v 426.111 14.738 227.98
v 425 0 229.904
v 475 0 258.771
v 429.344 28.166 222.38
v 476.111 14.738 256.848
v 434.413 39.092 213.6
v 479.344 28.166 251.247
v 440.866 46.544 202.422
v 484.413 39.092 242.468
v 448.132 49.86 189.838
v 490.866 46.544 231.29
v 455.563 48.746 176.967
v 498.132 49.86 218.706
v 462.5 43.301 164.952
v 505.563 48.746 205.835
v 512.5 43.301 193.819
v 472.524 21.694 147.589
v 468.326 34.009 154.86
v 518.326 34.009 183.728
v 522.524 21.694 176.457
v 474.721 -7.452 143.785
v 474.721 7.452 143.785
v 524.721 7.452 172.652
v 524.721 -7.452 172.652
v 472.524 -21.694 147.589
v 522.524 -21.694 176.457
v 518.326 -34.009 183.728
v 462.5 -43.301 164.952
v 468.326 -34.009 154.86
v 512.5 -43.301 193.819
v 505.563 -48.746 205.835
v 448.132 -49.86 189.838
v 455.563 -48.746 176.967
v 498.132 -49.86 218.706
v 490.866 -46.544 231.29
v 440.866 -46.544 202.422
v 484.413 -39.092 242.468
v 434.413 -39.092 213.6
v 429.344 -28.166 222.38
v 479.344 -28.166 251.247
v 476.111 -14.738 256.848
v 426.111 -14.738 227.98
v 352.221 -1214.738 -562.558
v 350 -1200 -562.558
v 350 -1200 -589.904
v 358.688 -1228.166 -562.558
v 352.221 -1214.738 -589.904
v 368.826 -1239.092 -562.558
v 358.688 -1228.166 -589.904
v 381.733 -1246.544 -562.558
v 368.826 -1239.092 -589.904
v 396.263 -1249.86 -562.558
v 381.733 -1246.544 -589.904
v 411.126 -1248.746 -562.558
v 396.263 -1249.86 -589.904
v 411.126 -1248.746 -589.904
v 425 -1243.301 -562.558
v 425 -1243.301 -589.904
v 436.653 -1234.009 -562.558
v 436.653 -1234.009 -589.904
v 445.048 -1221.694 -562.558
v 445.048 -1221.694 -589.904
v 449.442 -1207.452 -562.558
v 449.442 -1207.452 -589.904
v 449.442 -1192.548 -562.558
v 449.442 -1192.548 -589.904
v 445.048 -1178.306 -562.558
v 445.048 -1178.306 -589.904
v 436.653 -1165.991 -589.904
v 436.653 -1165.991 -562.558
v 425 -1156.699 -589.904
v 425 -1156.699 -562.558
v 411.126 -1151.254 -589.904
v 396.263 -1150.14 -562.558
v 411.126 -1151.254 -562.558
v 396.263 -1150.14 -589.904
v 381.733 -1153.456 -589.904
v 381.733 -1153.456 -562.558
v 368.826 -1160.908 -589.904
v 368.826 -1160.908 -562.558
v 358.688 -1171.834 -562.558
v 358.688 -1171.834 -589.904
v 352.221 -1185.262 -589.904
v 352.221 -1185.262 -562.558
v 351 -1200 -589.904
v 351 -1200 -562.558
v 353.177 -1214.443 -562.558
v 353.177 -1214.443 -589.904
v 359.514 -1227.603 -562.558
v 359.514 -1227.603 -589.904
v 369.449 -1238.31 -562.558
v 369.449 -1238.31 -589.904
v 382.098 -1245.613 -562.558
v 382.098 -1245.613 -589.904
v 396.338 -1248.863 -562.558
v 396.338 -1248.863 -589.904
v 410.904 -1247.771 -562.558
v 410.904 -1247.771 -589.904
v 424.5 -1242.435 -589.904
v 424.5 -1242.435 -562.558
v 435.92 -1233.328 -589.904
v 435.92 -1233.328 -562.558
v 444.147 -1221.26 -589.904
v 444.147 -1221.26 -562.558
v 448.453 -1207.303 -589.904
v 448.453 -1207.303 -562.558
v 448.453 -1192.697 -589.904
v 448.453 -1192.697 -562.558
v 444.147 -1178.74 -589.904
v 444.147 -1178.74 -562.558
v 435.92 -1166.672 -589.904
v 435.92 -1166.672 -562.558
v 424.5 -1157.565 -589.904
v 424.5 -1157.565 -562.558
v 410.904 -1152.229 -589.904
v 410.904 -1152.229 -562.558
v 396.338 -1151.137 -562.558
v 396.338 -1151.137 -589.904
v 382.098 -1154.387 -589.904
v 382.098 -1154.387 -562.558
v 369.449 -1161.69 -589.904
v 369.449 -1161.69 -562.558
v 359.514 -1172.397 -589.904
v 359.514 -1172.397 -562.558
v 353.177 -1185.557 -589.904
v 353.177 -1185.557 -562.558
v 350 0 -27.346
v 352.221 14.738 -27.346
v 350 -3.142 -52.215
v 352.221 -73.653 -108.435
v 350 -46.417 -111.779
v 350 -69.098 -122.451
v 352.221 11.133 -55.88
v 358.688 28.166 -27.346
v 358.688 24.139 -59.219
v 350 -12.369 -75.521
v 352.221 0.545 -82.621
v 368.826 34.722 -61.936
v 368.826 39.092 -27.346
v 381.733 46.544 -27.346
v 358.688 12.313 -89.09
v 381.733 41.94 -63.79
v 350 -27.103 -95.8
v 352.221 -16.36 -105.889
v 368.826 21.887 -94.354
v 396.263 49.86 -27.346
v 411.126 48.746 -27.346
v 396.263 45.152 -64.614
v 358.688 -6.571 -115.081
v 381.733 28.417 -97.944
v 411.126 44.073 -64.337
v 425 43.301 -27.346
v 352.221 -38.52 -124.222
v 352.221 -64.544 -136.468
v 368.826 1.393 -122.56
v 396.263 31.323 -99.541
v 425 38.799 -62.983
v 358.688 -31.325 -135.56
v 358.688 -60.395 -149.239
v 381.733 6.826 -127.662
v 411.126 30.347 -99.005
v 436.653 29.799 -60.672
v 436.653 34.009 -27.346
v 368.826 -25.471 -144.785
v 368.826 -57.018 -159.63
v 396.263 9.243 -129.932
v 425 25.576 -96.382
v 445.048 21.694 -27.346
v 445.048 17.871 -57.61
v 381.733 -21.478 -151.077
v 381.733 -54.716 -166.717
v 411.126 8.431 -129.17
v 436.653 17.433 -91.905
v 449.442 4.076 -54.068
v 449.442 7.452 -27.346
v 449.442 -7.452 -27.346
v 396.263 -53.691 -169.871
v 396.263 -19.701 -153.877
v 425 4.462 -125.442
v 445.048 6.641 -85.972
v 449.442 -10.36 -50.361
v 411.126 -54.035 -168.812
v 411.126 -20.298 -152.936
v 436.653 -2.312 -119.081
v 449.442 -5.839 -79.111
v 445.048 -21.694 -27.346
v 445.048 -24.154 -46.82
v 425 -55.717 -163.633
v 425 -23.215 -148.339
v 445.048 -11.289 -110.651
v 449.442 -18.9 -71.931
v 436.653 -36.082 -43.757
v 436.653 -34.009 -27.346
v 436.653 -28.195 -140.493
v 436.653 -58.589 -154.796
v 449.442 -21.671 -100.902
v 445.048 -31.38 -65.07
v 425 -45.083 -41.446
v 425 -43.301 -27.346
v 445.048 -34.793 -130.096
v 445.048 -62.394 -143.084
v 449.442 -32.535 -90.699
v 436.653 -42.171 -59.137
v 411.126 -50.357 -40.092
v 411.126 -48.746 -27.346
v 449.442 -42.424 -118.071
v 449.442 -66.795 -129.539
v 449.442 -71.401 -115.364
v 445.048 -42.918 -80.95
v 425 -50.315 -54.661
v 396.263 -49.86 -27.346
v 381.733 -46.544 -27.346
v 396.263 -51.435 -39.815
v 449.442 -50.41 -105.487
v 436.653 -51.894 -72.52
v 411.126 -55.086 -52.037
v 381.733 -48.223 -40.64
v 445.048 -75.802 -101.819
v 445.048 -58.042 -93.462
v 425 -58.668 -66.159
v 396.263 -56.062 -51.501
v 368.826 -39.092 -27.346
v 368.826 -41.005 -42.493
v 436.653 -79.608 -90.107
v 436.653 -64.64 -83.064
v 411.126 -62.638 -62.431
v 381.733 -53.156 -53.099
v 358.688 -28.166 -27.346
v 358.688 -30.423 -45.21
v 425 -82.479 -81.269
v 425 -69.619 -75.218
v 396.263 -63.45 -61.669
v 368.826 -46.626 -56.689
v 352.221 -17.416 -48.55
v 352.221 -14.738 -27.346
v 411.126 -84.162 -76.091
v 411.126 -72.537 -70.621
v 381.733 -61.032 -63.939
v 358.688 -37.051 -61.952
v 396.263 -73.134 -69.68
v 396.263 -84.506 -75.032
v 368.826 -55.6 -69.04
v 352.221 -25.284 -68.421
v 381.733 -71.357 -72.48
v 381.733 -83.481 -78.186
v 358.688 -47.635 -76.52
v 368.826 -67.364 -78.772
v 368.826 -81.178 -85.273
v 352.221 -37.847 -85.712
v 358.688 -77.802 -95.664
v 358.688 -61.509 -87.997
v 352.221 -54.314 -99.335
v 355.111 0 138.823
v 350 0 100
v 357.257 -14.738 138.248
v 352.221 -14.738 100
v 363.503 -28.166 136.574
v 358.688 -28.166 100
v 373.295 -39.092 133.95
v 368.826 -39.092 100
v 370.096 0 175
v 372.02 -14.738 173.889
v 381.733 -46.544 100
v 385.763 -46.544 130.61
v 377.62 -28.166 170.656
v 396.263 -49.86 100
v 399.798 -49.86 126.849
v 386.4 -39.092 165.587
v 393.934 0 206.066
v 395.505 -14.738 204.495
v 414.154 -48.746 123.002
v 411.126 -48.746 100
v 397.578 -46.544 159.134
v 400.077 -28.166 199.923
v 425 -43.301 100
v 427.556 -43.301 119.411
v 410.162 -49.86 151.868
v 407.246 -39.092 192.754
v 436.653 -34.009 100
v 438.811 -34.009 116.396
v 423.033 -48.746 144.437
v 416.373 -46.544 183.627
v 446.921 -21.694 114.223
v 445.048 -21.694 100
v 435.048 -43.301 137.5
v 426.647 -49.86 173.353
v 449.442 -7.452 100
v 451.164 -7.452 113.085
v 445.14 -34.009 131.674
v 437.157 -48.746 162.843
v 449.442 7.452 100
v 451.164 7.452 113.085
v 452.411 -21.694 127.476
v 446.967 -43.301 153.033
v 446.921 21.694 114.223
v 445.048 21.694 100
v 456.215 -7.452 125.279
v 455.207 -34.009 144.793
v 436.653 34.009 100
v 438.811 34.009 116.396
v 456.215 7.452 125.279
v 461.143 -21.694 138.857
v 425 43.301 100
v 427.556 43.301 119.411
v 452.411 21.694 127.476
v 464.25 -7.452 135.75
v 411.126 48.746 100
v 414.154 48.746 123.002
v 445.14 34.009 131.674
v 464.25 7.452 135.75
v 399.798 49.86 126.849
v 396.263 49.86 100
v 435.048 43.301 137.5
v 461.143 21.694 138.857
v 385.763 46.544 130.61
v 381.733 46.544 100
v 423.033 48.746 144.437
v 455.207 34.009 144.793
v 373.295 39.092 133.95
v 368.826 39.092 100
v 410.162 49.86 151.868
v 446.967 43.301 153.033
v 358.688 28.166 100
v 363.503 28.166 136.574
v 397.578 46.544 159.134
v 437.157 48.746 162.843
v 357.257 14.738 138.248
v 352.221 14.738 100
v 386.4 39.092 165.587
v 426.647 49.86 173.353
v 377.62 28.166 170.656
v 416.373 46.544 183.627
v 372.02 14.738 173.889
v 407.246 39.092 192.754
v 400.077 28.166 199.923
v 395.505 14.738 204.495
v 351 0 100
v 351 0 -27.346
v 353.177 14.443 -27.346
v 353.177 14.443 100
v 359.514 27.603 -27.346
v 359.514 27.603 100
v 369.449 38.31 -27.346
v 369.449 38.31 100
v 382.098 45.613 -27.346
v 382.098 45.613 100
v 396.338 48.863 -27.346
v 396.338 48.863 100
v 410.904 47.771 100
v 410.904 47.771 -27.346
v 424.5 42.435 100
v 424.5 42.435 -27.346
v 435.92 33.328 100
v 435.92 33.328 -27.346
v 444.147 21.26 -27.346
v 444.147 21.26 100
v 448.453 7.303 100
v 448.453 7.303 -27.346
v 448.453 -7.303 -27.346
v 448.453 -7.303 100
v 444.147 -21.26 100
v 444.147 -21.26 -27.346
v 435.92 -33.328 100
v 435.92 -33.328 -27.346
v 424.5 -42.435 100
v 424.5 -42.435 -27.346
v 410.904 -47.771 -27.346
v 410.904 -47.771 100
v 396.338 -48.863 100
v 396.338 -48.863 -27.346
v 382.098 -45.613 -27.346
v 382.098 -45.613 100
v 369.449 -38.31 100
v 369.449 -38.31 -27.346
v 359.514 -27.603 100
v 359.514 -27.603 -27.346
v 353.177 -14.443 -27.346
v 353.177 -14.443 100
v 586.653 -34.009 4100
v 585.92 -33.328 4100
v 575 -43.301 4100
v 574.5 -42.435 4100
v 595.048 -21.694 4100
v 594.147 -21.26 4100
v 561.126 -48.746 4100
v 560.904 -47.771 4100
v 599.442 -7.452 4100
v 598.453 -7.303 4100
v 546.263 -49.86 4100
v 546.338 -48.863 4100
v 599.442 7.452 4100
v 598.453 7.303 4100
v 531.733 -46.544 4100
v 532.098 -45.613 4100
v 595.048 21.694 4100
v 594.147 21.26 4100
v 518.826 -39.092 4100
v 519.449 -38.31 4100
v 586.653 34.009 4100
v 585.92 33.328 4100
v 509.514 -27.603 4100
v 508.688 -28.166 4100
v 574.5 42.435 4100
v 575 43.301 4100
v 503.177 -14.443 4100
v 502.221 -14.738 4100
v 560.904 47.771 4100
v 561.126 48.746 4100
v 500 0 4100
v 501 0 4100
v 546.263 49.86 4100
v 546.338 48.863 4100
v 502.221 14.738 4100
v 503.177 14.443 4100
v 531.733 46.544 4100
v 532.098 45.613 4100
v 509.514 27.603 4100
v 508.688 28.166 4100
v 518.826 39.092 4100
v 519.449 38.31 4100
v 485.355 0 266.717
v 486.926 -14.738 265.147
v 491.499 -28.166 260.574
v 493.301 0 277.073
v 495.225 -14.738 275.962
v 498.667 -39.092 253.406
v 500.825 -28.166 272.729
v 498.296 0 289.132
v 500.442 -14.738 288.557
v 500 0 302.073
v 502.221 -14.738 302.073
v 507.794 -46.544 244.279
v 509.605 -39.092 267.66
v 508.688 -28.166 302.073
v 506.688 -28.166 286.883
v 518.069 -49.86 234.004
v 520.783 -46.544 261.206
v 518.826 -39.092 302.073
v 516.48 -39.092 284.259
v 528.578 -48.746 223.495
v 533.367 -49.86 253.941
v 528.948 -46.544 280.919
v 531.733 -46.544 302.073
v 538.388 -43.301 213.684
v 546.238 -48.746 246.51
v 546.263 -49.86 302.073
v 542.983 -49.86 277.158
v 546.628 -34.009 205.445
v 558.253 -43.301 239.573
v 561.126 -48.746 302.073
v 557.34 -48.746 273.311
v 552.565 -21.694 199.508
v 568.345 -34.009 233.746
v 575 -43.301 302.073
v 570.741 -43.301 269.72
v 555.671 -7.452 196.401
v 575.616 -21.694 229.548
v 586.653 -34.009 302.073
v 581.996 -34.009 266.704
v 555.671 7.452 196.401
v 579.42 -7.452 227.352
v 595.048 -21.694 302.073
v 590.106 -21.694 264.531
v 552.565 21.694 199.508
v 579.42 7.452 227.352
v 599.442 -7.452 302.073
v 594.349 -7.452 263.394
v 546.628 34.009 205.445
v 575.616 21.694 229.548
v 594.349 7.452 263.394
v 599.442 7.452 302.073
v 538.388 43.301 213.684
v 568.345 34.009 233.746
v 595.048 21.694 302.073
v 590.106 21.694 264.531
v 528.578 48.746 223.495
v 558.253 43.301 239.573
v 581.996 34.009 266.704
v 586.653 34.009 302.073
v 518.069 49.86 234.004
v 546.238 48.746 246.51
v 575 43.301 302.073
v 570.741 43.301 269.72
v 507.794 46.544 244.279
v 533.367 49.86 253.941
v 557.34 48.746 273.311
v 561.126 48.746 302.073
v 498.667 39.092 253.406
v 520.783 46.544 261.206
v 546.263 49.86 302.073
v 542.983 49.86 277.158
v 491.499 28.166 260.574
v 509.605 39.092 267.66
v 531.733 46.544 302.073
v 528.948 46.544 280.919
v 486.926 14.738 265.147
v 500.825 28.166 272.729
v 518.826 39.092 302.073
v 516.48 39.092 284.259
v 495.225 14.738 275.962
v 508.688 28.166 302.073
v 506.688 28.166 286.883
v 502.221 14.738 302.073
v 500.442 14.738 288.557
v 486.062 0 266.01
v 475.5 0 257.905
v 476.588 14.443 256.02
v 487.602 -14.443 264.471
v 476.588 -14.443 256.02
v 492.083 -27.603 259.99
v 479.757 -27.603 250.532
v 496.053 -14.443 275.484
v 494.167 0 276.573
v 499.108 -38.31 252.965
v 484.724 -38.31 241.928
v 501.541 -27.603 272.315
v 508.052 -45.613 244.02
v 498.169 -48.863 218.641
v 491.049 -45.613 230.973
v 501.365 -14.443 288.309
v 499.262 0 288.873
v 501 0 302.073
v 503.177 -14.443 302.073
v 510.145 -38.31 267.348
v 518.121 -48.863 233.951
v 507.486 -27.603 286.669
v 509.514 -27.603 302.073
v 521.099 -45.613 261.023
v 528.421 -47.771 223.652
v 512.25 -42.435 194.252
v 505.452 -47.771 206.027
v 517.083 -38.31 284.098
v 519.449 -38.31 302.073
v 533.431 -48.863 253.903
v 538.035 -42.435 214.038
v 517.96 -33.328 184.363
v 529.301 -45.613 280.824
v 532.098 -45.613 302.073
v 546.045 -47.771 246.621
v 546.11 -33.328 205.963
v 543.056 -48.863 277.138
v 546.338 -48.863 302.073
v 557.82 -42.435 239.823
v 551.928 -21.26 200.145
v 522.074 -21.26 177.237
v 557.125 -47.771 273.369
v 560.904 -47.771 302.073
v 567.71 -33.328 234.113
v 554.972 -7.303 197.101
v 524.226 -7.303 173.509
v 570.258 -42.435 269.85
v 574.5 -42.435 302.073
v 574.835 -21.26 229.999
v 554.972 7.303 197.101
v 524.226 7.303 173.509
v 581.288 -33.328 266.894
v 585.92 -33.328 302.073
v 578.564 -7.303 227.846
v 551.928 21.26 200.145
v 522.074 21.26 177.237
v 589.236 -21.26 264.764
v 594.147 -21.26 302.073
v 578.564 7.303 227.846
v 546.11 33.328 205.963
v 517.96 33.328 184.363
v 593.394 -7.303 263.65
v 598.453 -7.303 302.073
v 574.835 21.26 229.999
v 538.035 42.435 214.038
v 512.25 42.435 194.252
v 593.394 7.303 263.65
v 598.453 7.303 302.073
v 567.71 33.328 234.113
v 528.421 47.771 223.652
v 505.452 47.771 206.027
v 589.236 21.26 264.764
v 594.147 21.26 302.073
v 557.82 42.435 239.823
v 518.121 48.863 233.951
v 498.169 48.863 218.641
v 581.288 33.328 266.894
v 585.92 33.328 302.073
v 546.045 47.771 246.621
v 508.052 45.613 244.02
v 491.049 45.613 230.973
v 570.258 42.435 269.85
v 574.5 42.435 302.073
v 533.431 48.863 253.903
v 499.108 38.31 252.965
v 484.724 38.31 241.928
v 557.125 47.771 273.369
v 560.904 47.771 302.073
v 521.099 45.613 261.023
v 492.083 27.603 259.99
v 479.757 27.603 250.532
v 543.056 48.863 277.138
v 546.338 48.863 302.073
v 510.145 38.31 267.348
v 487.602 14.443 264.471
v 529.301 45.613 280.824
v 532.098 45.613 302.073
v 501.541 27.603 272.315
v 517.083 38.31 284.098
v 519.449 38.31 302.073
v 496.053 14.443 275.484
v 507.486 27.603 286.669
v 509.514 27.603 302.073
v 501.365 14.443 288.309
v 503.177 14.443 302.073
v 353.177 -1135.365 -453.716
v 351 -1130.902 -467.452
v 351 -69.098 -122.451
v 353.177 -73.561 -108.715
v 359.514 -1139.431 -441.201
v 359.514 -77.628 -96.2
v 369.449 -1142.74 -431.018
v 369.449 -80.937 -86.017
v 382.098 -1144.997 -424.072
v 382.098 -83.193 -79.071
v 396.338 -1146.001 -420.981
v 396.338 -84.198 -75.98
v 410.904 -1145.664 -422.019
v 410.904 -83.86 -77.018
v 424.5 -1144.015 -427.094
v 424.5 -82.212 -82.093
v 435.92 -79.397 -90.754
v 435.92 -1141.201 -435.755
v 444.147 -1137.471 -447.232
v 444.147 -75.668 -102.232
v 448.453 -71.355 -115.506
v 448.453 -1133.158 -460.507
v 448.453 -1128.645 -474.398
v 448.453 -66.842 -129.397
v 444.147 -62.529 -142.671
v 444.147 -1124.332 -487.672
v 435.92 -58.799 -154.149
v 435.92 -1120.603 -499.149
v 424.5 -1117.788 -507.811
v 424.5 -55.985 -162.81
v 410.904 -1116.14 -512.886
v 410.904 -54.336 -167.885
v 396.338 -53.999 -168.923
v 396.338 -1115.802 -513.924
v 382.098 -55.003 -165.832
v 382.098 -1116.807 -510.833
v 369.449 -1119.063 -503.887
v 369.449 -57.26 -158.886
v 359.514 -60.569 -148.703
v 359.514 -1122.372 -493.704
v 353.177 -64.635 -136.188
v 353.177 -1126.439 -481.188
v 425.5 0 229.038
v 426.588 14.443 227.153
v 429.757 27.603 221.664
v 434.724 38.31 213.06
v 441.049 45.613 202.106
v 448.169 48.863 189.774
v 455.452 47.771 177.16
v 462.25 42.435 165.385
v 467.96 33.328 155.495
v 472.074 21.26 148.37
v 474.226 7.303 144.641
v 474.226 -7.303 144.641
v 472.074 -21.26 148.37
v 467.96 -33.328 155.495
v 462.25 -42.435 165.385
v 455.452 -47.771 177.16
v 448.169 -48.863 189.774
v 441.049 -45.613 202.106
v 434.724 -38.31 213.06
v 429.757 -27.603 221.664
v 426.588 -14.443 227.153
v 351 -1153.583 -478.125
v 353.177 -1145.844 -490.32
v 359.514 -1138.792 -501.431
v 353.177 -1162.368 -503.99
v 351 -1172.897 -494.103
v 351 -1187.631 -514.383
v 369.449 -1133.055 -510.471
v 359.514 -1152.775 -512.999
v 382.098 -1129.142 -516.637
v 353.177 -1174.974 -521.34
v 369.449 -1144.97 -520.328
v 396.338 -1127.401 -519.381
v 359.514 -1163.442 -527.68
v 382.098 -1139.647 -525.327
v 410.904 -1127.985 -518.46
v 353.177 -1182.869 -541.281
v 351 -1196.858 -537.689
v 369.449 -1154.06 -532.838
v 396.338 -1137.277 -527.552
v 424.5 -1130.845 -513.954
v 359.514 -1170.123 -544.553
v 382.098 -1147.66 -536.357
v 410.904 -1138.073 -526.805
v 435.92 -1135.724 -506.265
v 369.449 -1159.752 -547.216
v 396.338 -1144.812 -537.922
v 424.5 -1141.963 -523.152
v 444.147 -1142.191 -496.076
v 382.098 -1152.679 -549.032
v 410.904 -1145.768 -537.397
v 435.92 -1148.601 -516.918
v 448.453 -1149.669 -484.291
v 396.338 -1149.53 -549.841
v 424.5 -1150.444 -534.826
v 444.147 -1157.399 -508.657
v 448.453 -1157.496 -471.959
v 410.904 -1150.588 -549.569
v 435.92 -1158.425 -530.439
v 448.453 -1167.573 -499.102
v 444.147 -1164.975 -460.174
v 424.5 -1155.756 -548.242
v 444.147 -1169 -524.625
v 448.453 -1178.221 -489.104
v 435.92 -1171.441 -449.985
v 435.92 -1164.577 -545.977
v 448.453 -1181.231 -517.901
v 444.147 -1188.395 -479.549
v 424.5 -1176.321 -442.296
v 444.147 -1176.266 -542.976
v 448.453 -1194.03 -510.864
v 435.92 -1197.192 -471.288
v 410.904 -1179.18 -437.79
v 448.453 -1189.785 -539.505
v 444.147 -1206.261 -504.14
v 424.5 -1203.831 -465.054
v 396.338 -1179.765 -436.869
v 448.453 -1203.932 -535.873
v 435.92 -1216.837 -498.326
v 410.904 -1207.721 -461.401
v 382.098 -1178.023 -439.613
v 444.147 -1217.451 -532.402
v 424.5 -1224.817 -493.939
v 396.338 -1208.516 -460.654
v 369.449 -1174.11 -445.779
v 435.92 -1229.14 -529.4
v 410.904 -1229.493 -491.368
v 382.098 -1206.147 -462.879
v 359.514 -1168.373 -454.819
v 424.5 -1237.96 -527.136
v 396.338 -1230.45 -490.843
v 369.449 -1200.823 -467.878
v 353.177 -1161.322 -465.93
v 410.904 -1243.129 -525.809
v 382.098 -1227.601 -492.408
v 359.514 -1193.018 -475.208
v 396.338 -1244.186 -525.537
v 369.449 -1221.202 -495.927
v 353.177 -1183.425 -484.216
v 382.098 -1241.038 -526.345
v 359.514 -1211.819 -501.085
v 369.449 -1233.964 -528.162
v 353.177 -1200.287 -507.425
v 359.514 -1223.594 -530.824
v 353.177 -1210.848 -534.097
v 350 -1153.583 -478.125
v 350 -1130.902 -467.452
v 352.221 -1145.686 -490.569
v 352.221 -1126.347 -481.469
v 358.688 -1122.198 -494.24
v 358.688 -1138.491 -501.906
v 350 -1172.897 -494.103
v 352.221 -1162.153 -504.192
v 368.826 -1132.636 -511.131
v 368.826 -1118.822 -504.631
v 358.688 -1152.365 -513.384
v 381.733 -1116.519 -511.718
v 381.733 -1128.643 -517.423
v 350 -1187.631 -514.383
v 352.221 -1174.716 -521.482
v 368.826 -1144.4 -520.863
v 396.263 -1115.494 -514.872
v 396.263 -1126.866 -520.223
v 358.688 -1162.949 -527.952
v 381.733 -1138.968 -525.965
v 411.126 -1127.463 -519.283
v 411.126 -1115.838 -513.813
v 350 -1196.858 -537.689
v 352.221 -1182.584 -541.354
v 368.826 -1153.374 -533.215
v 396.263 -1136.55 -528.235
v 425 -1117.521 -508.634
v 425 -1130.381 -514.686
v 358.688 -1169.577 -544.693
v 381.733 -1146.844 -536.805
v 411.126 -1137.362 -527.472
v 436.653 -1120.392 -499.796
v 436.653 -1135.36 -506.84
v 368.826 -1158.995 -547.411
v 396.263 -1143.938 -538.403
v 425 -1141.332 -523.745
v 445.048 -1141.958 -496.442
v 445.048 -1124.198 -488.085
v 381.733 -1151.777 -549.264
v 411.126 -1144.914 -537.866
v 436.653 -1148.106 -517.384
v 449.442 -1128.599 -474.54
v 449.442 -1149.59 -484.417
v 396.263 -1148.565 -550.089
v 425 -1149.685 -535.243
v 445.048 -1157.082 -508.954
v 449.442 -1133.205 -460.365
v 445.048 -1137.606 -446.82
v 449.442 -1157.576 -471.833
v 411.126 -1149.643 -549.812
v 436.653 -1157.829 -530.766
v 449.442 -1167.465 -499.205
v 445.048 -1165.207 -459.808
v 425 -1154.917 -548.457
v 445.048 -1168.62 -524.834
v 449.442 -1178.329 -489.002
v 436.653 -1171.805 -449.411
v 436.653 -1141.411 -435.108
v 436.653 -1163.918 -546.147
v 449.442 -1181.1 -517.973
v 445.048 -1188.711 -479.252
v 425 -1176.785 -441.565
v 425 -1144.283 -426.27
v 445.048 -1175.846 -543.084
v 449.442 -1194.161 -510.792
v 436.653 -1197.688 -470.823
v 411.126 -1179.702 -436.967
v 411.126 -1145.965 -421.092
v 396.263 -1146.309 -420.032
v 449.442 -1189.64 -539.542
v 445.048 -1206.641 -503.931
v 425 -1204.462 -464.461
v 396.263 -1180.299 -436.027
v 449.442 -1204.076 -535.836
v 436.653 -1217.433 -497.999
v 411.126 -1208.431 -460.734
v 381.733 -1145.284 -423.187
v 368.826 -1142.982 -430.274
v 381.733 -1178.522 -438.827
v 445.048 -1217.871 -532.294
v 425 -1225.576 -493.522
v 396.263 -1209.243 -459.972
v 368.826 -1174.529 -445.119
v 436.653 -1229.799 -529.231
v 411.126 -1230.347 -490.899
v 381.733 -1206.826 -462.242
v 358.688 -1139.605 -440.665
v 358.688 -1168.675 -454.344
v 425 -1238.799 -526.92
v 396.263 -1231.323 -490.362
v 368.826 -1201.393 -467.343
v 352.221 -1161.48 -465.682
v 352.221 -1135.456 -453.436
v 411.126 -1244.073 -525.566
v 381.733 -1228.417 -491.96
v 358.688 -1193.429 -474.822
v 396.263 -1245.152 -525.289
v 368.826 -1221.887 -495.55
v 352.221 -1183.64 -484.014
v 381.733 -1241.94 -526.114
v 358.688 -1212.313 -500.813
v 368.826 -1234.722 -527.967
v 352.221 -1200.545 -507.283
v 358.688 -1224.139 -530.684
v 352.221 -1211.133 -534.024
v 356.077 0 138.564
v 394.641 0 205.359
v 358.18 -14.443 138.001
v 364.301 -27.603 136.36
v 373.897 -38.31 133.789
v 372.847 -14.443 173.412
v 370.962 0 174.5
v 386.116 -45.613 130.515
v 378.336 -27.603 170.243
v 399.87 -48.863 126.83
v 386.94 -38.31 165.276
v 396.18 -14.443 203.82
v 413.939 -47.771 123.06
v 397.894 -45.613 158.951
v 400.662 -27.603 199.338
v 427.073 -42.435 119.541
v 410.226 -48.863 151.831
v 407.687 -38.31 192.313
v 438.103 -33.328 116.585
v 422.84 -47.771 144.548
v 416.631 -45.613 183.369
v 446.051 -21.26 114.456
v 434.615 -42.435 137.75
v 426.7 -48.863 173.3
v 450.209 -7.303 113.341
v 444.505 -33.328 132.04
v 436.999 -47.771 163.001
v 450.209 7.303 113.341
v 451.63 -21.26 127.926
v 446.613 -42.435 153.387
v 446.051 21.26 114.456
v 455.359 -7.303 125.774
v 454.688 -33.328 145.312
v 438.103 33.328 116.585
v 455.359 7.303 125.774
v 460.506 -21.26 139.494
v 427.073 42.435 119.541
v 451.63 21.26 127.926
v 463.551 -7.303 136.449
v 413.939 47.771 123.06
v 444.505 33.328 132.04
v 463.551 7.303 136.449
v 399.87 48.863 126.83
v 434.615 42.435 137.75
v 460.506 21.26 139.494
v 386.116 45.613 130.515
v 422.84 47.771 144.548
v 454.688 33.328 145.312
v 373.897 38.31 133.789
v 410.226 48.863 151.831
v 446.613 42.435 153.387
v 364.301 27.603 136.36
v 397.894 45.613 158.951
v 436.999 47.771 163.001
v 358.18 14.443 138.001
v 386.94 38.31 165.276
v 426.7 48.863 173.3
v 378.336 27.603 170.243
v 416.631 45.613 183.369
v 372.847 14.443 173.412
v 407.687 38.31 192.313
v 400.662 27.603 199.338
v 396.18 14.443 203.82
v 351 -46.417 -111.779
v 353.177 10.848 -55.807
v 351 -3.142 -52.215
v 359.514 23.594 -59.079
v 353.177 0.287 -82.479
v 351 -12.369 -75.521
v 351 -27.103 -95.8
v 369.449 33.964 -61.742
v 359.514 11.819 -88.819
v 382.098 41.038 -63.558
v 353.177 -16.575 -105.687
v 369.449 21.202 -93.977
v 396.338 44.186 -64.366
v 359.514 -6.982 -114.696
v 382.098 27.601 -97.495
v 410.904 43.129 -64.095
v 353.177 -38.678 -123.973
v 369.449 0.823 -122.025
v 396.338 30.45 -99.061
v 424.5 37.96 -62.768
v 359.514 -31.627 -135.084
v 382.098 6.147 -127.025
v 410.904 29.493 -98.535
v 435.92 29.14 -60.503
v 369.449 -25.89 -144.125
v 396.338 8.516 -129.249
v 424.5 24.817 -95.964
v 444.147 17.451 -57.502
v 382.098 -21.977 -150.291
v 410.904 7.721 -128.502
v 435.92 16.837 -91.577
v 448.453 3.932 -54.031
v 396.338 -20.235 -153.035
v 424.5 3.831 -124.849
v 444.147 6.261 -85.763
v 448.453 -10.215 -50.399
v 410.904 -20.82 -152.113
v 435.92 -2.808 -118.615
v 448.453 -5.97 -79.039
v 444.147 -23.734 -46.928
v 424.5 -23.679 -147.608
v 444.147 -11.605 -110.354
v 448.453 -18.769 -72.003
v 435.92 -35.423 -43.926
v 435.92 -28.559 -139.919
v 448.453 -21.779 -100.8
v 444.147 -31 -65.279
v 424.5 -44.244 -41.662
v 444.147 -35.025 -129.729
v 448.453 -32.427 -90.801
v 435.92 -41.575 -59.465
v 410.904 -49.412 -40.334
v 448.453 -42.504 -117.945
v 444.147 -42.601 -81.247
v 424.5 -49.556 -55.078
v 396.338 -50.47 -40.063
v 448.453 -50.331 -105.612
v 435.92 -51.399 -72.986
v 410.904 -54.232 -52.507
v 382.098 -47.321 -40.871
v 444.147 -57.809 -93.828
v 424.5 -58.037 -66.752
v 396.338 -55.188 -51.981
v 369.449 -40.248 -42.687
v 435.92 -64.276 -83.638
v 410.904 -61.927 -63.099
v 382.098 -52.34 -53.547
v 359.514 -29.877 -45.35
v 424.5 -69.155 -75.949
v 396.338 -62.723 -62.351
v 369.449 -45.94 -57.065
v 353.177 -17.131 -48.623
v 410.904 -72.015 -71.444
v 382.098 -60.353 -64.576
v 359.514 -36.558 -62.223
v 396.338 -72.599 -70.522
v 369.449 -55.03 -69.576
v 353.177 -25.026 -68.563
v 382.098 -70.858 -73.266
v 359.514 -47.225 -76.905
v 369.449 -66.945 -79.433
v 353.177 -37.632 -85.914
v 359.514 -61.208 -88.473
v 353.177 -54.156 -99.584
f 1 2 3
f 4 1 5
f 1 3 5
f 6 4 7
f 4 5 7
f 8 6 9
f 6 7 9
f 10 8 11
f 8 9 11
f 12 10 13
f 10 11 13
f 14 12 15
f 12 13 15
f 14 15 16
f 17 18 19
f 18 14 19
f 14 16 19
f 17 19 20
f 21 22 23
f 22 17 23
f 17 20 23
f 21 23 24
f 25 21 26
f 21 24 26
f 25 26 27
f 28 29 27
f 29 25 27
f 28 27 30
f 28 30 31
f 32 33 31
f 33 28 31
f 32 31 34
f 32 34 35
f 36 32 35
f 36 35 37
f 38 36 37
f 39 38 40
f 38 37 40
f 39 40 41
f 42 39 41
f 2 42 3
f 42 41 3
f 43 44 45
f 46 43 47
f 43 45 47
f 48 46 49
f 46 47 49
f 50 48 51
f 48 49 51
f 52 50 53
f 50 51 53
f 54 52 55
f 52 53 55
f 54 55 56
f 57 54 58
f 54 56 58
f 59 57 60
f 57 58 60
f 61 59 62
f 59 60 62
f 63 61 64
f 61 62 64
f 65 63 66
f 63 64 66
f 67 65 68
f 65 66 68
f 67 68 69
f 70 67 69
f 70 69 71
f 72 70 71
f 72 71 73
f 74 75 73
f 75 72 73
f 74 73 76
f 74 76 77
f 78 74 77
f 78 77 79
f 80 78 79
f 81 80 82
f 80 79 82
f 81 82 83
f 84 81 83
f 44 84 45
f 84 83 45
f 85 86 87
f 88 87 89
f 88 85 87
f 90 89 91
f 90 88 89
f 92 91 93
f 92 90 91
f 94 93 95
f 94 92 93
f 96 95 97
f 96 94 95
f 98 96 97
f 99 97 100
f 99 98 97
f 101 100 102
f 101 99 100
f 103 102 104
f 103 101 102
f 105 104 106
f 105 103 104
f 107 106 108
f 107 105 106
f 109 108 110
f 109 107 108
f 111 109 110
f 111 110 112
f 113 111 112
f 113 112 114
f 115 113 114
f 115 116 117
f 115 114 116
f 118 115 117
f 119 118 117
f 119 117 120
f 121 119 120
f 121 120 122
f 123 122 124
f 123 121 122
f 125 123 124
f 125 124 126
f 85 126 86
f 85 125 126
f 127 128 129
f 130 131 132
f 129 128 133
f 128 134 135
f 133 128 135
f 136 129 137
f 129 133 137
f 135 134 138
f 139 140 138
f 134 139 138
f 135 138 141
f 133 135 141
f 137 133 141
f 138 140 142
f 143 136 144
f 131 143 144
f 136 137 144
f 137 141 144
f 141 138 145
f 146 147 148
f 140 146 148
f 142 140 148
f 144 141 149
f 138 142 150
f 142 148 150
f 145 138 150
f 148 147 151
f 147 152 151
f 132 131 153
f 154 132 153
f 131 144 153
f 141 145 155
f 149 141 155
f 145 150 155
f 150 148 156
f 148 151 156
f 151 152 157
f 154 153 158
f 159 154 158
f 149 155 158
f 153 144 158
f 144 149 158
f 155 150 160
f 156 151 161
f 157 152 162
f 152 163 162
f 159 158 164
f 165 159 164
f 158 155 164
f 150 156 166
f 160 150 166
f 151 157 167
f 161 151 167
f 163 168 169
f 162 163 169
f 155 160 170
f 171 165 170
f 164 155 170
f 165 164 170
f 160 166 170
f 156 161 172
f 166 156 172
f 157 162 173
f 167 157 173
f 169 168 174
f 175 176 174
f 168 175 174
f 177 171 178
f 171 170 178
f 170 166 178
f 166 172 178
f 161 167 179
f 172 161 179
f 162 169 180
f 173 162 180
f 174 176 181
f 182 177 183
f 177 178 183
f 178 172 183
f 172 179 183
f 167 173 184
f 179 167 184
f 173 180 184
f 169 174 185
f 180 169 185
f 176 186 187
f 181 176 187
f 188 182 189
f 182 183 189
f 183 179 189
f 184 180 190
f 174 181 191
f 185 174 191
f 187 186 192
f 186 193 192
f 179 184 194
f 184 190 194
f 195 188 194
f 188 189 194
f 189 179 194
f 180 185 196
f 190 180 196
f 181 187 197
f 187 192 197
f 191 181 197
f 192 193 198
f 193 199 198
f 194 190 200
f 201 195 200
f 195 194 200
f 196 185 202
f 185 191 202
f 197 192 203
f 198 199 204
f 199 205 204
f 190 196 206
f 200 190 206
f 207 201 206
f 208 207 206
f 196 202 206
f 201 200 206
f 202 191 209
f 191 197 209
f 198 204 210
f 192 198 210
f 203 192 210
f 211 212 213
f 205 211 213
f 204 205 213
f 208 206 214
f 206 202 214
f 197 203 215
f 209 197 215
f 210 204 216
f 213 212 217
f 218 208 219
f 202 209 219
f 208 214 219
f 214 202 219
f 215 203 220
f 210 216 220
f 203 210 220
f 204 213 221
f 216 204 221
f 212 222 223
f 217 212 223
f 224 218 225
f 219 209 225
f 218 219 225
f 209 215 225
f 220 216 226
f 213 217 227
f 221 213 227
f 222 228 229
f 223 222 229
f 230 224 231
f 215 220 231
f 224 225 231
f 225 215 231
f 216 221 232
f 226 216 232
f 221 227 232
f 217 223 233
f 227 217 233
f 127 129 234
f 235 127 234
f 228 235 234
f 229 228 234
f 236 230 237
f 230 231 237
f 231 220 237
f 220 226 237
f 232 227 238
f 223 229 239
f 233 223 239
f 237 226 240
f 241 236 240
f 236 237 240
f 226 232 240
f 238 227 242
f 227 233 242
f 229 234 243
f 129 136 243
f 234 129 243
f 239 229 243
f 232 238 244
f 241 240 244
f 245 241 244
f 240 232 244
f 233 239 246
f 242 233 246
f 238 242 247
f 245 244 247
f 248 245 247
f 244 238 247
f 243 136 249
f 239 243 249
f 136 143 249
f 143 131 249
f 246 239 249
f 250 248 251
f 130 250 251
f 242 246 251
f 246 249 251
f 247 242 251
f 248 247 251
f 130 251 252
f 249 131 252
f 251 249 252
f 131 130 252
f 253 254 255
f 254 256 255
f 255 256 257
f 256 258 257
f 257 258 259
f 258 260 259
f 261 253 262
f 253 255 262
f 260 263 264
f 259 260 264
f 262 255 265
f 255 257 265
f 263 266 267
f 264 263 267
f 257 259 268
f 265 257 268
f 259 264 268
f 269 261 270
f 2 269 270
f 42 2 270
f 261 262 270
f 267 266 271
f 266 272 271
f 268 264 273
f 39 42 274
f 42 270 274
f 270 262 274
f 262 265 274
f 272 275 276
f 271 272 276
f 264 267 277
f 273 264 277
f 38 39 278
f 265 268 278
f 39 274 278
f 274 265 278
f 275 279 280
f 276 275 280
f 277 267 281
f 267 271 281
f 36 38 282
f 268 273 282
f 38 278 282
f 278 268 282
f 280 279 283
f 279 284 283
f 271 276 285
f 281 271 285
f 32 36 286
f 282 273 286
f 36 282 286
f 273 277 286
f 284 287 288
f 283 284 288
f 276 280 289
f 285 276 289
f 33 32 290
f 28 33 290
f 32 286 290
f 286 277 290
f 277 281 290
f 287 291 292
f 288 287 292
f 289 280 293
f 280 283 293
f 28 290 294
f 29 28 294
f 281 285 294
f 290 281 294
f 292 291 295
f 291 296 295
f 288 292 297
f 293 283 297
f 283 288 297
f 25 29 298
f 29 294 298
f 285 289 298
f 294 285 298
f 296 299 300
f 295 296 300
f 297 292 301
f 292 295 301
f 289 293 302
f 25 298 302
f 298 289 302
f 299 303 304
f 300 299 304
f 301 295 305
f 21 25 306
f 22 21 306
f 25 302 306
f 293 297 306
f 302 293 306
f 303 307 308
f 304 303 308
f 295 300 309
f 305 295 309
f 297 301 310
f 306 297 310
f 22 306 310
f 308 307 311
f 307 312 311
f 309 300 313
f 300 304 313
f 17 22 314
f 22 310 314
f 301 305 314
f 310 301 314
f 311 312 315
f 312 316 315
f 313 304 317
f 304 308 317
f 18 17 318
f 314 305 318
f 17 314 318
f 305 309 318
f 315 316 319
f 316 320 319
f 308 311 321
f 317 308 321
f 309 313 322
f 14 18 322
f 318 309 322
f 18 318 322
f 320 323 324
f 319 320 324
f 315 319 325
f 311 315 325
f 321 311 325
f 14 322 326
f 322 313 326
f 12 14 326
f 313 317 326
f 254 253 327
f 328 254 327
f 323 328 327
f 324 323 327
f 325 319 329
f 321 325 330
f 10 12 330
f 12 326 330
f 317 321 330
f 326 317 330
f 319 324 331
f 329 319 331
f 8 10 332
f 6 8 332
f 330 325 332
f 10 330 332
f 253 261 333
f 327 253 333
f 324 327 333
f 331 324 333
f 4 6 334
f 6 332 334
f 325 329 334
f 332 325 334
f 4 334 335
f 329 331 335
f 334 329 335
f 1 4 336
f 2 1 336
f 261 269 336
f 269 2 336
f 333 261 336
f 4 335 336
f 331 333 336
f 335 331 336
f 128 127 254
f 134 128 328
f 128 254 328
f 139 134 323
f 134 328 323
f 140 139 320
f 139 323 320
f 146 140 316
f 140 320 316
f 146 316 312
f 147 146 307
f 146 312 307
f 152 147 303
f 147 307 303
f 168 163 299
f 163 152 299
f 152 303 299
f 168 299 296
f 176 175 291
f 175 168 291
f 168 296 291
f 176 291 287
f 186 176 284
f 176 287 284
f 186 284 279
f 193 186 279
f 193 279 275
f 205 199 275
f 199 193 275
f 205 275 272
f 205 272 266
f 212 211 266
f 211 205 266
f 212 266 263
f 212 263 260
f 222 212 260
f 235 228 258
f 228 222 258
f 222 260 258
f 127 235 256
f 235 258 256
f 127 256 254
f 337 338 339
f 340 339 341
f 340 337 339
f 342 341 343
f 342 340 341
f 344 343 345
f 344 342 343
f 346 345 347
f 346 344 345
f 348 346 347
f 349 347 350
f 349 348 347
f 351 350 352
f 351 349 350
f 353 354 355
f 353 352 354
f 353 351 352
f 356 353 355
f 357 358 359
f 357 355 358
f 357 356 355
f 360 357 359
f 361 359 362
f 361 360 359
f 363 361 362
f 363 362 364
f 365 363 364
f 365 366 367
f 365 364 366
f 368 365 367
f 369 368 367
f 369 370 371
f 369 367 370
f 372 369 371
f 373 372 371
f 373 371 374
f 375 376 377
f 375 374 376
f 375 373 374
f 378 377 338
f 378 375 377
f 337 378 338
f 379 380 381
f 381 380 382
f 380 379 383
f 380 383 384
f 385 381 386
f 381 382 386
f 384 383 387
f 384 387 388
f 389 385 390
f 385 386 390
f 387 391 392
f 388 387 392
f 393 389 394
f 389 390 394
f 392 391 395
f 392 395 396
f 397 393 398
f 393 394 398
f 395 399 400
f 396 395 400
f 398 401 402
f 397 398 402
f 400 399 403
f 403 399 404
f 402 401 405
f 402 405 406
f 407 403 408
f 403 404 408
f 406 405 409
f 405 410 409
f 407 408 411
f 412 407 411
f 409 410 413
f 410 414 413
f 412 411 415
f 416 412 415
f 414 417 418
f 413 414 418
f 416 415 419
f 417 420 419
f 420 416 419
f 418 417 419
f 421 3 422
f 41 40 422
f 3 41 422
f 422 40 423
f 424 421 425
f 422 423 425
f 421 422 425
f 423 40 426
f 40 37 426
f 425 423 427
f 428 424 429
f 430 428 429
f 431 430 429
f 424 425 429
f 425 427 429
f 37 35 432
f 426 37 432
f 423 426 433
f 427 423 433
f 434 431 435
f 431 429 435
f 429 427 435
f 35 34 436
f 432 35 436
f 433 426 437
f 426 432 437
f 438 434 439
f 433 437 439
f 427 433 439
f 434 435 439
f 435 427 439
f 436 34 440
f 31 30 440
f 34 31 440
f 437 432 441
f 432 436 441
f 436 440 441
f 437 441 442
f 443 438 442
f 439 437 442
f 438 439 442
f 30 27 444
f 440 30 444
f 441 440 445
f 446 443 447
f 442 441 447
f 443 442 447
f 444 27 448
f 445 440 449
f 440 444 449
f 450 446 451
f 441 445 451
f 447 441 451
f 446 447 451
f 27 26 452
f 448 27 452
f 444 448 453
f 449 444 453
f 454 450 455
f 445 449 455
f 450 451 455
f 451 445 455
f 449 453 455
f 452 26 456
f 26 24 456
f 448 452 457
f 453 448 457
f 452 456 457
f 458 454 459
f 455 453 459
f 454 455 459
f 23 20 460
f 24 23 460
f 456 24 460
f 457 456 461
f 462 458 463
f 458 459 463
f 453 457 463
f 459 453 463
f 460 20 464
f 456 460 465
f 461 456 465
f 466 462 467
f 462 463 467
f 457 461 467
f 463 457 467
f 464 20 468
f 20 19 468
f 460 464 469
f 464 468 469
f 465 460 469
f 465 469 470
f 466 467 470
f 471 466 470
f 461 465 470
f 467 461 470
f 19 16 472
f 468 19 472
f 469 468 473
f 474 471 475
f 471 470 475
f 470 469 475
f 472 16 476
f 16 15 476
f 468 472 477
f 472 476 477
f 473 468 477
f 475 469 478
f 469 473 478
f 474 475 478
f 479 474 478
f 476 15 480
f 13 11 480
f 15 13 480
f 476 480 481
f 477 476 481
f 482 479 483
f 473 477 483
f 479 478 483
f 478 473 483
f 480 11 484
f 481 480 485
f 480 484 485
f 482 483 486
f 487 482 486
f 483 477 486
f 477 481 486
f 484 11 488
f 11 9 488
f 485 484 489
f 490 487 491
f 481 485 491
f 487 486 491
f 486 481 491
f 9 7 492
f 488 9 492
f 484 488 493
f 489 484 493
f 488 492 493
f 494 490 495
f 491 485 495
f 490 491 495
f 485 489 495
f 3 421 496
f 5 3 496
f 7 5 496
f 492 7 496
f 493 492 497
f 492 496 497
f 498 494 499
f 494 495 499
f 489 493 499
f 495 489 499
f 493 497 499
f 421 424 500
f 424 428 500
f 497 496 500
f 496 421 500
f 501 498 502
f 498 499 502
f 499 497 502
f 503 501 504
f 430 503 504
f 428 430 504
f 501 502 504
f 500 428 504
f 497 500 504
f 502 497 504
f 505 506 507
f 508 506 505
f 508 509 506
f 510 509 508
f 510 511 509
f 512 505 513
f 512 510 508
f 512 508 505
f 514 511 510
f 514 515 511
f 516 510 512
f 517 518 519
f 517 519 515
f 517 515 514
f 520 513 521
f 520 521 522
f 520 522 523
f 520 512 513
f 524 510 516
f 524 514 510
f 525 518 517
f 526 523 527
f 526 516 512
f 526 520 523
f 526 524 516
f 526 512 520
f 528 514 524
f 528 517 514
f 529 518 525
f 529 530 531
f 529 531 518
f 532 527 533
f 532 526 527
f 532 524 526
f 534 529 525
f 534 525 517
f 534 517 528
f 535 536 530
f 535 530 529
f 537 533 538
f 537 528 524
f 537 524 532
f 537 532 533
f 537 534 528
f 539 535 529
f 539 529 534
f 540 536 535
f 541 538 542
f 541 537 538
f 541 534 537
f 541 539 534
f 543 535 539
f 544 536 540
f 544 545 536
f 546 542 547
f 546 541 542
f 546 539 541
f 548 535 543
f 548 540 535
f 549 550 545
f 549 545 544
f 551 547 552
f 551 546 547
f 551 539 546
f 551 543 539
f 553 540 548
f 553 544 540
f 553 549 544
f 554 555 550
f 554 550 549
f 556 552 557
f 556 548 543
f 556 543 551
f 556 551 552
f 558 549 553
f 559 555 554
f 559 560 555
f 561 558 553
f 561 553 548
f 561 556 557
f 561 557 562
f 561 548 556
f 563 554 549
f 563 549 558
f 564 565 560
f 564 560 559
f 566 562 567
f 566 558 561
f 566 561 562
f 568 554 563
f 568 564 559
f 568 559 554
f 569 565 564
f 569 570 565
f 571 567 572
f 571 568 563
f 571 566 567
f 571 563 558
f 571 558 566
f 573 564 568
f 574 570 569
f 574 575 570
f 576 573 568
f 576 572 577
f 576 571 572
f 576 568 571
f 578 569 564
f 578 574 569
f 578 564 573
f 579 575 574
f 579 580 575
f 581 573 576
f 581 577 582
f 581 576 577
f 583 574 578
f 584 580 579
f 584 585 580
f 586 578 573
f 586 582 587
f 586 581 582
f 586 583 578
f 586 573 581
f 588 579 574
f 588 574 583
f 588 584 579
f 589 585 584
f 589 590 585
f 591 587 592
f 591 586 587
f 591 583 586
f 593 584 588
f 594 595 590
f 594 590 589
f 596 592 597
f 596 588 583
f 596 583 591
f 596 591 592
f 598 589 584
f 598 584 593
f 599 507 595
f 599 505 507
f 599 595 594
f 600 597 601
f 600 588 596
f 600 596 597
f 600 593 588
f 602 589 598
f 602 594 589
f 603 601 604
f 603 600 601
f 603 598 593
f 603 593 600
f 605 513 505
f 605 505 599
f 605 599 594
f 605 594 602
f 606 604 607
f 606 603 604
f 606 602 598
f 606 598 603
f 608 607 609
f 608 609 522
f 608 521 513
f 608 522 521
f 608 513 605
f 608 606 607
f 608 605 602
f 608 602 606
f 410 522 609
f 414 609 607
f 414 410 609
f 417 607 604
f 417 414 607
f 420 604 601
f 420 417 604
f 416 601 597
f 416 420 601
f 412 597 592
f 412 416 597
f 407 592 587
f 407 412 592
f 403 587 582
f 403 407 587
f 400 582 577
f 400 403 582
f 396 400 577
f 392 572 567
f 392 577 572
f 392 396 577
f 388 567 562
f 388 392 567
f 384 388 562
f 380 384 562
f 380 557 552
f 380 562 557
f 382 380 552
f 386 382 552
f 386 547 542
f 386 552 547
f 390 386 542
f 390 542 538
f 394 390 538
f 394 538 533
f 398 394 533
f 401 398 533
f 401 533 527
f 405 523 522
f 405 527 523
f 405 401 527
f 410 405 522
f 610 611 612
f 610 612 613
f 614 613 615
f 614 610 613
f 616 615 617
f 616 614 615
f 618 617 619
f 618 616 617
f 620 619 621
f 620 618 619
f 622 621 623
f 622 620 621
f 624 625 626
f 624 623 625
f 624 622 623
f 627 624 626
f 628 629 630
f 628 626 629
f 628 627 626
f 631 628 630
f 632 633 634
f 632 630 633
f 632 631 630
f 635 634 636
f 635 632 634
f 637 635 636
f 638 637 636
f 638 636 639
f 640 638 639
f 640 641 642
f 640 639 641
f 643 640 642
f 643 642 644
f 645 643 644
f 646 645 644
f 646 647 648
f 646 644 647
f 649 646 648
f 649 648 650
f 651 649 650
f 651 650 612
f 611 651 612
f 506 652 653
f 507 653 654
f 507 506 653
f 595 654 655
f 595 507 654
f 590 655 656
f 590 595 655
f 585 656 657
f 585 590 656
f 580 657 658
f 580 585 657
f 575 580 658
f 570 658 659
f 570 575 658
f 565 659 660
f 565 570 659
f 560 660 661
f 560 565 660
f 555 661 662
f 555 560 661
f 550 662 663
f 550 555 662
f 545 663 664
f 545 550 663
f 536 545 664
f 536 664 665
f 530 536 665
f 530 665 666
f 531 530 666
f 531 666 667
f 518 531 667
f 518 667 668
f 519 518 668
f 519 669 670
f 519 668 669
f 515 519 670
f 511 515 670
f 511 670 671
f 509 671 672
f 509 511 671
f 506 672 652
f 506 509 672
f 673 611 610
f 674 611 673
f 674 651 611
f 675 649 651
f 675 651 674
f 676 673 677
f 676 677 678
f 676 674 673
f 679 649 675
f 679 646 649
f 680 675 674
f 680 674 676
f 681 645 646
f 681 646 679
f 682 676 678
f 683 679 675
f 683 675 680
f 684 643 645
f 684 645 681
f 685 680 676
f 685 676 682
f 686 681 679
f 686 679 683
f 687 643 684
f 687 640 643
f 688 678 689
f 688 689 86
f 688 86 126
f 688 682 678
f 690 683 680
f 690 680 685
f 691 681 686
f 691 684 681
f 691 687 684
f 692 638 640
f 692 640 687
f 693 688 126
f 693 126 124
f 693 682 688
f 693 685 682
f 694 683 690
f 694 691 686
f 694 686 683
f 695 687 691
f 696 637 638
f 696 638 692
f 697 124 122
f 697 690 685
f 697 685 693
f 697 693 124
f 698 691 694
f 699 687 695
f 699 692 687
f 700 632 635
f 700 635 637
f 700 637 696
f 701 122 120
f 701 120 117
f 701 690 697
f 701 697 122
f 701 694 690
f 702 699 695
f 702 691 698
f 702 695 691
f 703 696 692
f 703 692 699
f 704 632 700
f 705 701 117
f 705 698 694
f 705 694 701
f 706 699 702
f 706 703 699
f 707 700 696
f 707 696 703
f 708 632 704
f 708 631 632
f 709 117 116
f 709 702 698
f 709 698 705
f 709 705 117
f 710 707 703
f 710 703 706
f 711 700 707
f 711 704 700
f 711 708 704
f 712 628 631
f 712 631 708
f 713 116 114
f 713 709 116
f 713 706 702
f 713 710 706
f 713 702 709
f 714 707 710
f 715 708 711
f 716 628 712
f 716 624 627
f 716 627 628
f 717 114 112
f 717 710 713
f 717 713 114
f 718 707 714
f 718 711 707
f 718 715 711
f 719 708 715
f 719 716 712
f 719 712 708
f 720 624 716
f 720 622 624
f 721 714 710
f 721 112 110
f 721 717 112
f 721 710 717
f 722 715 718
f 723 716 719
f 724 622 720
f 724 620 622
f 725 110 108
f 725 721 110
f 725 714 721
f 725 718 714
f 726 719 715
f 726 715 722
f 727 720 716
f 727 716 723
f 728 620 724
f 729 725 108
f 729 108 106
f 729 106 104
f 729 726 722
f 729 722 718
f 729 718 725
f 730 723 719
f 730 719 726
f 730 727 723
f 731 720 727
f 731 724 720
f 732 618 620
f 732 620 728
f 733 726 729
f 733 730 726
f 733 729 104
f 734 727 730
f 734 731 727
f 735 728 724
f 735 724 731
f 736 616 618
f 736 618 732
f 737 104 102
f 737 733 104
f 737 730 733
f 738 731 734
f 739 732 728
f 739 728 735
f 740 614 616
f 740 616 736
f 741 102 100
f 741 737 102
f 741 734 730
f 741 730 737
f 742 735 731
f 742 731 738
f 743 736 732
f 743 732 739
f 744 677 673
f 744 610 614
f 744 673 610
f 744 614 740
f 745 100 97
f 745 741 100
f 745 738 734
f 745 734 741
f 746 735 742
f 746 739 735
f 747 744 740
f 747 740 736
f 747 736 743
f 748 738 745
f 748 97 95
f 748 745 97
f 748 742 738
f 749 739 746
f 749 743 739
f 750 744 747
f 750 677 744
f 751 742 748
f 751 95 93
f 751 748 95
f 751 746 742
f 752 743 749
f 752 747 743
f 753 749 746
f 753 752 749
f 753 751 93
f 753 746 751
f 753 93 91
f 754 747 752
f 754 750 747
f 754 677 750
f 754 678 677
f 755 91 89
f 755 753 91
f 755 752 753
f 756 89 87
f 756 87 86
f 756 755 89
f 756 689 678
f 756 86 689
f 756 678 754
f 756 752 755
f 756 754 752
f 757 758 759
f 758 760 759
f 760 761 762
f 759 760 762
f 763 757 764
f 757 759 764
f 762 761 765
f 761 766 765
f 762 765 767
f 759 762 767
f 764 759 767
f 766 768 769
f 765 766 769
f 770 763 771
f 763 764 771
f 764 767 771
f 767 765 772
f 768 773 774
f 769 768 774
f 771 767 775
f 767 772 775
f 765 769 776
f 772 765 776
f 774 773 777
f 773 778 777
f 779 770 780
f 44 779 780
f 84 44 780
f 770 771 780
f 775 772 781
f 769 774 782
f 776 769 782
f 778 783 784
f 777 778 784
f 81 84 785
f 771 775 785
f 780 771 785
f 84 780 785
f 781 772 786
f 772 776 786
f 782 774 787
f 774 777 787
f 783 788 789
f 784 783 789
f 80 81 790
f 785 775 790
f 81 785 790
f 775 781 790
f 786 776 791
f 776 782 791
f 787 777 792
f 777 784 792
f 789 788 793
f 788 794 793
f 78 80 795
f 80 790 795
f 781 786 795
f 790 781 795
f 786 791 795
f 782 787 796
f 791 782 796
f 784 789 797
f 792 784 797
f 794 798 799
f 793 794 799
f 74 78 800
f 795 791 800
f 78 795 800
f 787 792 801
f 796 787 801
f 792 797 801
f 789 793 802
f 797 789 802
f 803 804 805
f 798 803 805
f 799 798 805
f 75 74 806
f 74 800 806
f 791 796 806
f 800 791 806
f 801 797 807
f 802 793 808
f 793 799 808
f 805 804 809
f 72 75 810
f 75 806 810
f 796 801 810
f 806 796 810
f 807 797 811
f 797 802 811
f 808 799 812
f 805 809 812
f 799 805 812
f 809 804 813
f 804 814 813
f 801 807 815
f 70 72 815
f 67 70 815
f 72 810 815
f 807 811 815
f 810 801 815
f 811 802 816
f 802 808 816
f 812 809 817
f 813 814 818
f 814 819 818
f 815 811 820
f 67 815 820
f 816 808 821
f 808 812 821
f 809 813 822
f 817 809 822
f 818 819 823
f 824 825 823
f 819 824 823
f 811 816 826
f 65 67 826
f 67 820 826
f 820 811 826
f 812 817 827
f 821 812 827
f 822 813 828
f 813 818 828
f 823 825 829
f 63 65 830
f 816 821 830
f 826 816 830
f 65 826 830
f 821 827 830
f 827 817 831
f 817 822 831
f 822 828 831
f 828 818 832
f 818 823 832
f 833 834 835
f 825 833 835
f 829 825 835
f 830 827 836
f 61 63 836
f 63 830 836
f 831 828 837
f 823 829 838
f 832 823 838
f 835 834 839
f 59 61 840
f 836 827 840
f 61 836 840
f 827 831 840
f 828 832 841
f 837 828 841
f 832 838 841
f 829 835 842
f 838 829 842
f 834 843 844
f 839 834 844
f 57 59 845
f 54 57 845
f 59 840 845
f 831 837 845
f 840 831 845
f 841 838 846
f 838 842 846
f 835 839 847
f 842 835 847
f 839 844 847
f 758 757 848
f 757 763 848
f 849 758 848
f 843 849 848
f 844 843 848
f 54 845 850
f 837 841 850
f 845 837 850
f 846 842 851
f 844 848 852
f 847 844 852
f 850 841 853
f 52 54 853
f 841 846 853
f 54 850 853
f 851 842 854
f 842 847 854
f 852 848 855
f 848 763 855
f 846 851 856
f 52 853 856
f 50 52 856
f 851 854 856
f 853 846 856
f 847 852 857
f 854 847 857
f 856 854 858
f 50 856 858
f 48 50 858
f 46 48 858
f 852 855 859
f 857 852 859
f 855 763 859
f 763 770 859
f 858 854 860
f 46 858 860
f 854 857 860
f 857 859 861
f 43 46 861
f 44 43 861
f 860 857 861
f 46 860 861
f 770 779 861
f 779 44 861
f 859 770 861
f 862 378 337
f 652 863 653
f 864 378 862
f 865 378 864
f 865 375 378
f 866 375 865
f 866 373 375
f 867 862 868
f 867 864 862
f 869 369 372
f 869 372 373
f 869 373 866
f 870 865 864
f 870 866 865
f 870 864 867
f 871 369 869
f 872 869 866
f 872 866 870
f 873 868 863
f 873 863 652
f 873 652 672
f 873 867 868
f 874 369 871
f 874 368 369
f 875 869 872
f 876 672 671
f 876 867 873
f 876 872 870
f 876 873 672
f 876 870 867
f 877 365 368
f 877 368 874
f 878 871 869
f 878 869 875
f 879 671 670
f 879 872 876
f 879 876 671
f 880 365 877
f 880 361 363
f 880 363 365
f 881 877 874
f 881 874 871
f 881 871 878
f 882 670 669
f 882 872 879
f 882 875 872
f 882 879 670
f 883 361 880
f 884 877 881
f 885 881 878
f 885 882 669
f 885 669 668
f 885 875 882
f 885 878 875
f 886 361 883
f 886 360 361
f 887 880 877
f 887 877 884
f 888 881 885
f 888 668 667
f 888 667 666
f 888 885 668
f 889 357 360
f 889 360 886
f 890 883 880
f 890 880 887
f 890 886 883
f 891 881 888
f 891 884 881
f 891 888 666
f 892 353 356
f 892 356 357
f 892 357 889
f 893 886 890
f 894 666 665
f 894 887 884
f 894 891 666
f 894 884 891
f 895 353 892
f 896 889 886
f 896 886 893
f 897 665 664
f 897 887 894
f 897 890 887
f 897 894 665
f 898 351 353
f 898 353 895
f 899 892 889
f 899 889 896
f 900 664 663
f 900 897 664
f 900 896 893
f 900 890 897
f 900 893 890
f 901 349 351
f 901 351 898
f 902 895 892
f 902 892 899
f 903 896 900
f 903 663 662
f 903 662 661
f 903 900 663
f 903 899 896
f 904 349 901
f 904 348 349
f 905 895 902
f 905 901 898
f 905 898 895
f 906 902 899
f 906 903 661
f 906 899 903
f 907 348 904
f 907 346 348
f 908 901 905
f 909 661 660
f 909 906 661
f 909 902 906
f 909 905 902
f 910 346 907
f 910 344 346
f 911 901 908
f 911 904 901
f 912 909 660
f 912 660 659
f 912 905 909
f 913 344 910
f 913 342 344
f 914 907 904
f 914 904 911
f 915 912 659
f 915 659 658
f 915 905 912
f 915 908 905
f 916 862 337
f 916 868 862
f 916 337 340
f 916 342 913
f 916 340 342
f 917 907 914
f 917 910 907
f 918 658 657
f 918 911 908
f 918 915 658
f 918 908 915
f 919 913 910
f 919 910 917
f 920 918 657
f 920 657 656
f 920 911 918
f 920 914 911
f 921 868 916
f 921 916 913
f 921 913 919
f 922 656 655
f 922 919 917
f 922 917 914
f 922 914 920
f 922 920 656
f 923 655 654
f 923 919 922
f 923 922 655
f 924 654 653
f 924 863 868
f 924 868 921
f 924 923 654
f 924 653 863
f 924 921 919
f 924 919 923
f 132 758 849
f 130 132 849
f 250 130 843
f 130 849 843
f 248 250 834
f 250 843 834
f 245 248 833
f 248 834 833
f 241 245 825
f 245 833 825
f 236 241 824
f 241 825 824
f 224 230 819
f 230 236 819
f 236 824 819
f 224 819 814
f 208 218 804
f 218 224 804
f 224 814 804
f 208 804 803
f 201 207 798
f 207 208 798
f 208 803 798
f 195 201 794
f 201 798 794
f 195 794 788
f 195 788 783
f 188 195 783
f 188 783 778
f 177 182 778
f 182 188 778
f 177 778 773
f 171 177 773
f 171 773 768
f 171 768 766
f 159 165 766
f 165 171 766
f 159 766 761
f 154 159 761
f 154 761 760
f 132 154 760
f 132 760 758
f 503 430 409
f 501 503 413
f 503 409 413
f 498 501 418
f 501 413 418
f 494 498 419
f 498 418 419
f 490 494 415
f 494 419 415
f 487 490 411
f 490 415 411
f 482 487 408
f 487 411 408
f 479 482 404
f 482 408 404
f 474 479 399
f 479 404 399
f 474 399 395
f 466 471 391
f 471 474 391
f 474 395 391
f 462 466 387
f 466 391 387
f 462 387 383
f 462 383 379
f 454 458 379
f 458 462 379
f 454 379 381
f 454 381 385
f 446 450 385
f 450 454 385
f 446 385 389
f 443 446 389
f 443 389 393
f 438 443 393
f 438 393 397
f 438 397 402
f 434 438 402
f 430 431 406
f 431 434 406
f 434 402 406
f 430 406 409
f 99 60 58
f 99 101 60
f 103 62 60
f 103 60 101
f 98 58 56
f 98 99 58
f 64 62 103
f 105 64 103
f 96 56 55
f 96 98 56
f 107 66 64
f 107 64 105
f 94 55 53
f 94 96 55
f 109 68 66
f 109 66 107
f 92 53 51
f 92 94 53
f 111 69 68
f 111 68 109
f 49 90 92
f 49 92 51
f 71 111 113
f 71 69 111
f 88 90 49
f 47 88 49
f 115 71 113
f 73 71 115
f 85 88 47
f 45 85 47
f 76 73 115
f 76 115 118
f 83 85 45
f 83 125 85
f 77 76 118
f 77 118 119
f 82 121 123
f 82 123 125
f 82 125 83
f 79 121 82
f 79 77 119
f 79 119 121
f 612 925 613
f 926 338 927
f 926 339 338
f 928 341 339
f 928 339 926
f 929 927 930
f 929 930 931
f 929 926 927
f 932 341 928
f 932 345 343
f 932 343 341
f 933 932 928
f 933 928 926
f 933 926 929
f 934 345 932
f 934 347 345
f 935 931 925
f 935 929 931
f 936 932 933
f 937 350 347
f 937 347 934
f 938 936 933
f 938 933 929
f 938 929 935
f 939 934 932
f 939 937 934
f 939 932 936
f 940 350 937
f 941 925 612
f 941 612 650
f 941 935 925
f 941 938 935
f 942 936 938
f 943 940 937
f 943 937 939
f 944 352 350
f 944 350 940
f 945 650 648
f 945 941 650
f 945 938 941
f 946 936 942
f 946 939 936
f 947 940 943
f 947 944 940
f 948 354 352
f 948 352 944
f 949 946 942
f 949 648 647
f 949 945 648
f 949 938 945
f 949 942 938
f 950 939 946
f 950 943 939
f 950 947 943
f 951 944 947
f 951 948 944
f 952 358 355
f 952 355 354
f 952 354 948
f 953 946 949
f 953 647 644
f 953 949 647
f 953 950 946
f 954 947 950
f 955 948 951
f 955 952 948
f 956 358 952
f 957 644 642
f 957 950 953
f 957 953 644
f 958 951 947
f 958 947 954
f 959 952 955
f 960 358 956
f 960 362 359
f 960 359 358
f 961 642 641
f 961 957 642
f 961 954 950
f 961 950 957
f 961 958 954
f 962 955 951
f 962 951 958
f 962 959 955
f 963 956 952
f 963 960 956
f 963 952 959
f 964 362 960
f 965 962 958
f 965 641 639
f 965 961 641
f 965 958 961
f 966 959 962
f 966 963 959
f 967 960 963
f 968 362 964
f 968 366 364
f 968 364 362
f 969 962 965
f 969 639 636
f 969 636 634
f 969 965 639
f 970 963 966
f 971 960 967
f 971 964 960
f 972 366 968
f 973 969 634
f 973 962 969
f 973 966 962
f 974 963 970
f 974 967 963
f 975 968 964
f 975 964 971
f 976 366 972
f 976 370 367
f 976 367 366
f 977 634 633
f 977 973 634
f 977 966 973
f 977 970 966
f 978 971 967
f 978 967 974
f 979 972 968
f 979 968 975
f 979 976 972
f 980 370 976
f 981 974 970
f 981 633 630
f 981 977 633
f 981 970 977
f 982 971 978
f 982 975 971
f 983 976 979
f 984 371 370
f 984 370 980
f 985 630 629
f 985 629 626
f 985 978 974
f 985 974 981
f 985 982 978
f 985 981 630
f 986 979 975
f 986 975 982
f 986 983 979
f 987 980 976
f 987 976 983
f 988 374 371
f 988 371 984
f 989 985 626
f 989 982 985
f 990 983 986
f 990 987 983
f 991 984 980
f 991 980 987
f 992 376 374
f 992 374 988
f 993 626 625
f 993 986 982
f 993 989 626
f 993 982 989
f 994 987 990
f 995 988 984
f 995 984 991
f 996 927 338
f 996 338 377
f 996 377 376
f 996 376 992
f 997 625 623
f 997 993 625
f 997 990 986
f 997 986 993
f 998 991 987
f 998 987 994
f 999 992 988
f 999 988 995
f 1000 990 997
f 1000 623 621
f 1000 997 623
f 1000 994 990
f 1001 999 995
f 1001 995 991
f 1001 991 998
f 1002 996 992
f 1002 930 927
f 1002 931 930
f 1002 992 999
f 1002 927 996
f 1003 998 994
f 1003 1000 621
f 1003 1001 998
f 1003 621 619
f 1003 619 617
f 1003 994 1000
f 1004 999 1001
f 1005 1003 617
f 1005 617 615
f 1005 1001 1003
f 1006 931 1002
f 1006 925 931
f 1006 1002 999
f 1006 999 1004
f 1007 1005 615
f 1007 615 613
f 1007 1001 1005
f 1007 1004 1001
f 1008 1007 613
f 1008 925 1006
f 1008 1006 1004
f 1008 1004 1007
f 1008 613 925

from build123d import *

# Parameters (mm, degrees)
F1_R        = 50
F1_R_2      = 49
F2_FACE_R   = 50
F2_FACE_R_2 = 49


with BuildPart() as f2:
    # F2: sweep along a path in F0
    with BuildLine(Plane.YZ) as f2_path:
        Line((0, 0), (0, -27.3457471995))
        ThreePointArc((0, -27.3457471995), (-19.0983005625, -86.1242724287), (-69.0983005625, -122.451398829))
        Line((-69.0983005625, -122.451398829), (-1130.9016994375, -467.4522366505))
        ThreePointArc((-1130.9016994375, -467.4522366505), (-1180.9016994375, -503.7793630508), (-1200, -562.55788828))
        Line((-1200, -562.55788828), (-1200, -589.9036354795))
    # F1 (on Top) → F2 (sweep)
    with BuildSketch(Plane.XY):
        Circle(F1_R)
        Circle(F1_R_2, mode=Mode.SUBTRACT)
    sweep(path=f2_path.line)

    # F4: sweep along a path in F3
    with BuildLine(Plane.XZ) as f4_path:
        Line((0, 0), (0, 100))
        ThreePointArc((0, 100), (-13.3974596216, 150), (-50, 186.6025403784))
        Line((-50, 186.6025403784), (-100, 215.4700538379))
        ThreePointArc((-100, 215.4700538379), (-136.6025403784, 252.0725942164), (-150, 302.0725942164))
        Line((-150, 302.0725942164), (-150, 4100))
    # F2_face (on face) → F4 (sweep)
    with BuildSketch(Plane.XY):
        Circle(F2_FACE_R)
        Circle(F2_FACE_R_2, mode=Mode.SUBTRACT)
    sweep(path=f4_path.line)


with BuildPart() as f6_1:
    # F6: instance of F2
    add(f2.part.mirror(Plane.YZ.offset(200)))


solid = f6_1.part
